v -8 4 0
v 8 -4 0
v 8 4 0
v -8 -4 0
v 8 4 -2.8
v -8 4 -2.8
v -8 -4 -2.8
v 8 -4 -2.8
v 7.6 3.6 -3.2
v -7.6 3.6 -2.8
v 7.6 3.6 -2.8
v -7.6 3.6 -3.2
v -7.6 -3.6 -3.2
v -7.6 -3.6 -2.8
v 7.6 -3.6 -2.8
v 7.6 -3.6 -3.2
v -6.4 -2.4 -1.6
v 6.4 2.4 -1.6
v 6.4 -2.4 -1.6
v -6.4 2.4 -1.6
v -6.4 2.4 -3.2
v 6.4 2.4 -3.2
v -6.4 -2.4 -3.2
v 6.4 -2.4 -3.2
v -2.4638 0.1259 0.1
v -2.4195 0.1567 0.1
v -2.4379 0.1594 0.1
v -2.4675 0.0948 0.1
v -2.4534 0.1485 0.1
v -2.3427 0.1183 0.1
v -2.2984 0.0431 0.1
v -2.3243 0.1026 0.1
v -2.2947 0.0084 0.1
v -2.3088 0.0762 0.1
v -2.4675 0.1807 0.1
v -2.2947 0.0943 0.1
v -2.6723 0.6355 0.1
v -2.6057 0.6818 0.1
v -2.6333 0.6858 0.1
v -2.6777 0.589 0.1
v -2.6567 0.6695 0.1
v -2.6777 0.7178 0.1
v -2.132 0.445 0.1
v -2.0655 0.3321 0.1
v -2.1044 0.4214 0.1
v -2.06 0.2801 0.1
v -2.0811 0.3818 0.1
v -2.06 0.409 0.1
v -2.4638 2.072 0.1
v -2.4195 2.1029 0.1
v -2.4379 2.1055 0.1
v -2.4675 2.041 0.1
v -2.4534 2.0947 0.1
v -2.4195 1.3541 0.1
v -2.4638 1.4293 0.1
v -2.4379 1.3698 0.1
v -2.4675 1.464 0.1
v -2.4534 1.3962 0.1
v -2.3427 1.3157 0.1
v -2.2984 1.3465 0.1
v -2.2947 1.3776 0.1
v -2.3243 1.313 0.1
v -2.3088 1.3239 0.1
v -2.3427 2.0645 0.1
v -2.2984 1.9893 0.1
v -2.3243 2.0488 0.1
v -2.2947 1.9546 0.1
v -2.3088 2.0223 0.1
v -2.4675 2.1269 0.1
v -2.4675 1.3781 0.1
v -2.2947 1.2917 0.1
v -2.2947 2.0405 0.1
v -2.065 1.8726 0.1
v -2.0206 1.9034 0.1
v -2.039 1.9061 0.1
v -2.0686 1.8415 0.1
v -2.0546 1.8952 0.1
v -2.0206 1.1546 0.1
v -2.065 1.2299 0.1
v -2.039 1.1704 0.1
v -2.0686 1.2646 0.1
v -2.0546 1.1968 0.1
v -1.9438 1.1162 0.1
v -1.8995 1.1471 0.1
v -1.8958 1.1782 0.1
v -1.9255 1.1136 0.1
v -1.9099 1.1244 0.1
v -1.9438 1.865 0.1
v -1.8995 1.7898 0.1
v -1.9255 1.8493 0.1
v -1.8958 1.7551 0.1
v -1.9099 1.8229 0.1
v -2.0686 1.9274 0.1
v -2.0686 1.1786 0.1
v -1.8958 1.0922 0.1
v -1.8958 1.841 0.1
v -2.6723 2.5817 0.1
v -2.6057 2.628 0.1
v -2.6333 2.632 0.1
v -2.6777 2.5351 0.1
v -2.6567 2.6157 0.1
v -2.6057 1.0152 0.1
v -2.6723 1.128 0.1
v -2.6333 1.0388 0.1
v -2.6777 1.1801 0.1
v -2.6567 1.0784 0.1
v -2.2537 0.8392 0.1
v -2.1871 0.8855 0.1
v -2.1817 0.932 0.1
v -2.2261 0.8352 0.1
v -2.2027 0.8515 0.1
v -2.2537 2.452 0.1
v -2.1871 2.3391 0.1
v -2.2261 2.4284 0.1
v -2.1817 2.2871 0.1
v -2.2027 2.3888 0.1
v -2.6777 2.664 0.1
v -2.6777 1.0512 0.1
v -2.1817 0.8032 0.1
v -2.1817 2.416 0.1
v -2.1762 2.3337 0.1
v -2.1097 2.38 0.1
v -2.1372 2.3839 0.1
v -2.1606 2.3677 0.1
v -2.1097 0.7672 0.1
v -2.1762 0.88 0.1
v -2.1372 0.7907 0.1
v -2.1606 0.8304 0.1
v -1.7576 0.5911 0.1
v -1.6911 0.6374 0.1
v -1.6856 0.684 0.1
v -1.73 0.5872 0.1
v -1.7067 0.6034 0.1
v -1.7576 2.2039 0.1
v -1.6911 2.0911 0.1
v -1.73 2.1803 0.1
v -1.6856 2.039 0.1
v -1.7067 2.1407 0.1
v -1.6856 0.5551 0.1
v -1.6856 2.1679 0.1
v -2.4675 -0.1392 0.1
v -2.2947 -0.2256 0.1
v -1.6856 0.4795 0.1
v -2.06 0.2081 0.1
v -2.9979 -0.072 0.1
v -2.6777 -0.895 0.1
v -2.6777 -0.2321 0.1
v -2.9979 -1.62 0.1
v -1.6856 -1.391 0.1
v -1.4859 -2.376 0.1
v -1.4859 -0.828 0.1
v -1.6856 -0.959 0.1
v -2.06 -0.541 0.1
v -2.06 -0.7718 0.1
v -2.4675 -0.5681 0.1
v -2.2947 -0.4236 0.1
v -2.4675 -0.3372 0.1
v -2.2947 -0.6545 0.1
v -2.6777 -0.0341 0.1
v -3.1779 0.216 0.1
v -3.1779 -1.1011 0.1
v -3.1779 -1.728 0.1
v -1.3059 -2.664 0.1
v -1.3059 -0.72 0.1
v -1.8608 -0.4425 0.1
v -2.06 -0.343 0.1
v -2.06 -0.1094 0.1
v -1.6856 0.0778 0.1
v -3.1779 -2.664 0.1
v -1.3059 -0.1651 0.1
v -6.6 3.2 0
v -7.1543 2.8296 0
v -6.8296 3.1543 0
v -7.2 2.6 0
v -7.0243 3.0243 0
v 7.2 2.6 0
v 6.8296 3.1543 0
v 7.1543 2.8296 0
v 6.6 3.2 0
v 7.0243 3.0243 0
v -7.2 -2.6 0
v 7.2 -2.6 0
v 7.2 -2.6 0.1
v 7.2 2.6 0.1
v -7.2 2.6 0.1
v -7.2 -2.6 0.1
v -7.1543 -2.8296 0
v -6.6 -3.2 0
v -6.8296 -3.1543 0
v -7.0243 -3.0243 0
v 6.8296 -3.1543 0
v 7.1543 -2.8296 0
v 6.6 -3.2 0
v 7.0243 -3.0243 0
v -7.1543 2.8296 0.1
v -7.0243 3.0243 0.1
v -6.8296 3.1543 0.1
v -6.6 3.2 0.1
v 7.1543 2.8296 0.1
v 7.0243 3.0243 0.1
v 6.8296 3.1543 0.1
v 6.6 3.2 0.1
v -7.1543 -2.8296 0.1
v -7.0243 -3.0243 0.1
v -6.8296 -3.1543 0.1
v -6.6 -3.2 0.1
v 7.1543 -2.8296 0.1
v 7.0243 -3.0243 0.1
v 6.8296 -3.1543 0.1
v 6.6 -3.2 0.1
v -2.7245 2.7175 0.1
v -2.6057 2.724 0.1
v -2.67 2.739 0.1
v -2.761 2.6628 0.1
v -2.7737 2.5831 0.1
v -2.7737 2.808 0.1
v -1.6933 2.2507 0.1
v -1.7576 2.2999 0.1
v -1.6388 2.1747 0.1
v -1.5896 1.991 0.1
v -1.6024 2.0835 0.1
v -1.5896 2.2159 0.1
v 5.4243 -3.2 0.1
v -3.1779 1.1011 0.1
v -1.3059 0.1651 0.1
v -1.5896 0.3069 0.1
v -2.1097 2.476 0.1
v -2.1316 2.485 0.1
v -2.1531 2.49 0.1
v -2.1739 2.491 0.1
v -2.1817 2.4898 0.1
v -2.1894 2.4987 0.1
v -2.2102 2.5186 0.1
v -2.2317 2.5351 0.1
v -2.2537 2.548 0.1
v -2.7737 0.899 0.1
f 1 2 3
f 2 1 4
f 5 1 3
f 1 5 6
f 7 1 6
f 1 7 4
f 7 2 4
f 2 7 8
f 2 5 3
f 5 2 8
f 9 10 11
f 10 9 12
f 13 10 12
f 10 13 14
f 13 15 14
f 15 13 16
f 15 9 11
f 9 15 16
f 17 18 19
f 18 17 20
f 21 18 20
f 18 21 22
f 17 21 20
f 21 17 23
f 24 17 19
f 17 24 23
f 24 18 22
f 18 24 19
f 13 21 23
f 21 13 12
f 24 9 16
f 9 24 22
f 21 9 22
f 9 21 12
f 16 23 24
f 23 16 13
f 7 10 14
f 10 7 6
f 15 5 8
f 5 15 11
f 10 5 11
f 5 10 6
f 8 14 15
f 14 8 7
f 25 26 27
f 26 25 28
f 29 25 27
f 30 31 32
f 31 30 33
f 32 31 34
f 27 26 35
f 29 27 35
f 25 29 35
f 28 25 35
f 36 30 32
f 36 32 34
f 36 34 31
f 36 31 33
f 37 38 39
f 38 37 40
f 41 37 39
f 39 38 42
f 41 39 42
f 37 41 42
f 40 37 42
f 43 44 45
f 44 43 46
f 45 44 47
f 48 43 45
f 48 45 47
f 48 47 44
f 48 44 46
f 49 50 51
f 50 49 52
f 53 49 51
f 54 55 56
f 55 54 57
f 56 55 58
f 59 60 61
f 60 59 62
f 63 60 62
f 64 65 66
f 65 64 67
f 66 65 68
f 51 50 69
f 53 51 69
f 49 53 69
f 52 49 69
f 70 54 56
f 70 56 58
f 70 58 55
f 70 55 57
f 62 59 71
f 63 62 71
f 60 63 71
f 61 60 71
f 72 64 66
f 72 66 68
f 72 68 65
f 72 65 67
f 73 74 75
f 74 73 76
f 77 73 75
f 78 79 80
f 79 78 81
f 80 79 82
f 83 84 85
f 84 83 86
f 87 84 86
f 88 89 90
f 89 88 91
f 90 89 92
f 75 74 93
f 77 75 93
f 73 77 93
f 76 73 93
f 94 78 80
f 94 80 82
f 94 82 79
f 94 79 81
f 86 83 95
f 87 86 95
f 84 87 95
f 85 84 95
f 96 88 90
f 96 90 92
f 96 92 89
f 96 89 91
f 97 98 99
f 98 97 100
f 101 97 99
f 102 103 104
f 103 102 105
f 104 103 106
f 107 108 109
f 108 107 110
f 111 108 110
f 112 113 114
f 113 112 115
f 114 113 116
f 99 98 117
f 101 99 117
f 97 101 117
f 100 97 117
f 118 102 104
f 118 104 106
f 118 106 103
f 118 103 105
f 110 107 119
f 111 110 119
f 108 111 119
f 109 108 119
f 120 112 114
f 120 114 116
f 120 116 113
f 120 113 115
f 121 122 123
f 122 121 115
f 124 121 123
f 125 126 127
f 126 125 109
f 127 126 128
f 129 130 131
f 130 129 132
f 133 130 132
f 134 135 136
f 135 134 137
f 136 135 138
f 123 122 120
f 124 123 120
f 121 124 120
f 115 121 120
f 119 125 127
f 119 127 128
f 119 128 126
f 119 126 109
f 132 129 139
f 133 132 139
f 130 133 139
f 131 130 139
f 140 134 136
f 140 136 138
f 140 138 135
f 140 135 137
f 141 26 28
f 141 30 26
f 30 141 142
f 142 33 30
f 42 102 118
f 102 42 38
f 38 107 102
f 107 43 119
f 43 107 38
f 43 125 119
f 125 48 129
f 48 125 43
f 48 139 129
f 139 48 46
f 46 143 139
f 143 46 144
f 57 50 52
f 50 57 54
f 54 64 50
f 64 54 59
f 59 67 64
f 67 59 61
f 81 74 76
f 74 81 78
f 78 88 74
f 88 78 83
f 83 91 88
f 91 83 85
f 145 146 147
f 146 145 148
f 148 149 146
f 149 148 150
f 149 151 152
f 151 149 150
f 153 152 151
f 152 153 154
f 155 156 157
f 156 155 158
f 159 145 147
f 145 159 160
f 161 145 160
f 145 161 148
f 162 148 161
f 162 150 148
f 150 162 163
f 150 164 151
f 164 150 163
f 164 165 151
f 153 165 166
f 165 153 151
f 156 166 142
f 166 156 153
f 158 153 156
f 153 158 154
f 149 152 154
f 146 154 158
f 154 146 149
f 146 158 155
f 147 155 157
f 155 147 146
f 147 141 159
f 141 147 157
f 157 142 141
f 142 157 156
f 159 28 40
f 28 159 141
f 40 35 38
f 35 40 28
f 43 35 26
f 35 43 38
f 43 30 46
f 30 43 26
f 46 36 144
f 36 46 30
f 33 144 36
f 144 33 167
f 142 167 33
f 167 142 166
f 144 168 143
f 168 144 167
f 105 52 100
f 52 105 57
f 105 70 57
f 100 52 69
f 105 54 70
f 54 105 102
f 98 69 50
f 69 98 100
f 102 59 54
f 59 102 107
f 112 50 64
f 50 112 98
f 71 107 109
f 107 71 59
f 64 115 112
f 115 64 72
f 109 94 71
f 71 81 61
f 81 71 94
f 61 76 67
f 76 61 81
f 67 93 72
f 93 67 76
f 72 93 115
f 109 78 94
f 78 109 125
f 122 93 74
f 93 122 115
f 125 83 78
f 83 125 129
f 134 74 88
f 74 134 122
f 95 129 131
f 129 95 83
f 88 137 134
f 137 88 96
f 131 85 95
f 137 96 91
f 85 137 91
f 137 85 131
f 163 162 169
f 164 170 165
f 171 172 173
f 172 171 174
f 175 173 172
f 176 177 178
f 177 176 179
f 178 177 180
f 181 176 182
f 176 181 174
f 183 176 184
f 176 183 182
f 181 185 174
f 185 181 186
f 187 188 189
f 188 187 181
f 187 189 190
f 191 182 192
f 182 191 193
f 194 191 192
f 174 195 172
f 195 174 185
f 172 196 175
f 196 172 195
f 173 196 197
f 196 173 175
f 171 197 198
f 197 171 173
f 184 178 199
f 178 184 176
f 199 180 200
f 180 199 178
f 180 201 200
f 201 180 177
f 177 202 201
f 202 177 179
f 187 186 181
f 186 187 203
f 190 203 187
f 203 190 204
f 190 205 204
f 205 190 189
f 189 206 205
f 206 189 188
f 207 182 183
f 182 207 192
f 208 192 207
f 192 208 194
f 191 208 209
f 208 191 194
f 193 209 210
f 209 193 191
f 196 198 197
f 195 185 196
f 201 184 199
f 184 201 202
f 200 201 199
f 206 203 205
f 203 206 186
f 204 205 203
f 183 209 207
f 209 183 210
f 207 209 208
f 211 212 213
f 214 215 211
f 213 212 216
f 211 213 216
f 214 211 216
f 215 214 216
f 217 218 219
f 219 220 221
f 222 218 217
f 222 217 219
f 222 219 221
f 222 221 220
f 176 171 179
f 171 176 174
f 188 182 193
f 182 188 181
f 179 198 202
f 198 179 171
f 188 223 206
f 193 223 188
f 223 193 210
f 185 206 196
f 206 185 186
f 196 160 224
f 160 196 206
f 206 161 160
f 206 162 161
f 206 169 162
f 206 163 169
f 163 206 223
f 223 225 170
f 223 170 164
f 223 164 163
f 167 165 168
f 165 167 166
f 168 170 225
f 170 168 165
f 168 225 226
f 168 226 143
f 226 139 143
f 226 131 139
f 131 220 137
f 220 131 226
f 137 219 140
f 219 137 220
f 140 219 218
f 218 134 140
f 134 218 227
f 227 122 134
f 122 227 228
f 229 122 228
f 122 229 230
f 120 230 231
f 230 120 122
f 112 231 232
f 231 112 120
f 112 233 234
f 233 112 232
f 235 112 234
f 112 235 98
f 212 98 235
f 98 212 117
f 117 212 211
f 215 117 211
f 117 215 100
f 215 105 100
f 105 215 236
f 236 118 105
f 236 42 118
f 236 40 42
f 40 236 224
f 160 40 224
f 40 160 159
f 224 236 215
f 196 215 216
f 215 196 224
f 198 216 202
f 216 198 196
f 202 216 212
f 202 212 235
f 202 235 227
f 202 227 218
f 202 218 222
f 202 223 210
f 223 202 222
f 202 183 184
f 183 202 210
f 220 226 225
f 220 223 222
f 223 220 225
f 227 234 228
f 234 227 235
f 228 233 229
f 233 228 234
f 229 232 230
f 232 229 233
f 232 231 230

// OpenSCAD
// file: ../p/box5.scad
use <../lib.scad>
function ldraw_lib__box5() = [
// 0 Box with 5 Faces and All Edges
// 0 Name: box5.dat
// 0 Author: James Jessiman
// 0 !LDRAW_ORG Primitive UPDATE 2012-01
// 0 !LICENSE Licensed under CC BY 4.0 : see CAreadme.txt
// 
// 0 BFC CERTIFY CCW
  [0,"BFC","CERTIFY"],
  [0,"BFC","CCW"],
// 
// 0 !HISTORY 2002-04-03 [sbliss] Modified for BFC compliance
// 0 !HISTORY 2002-04-25 [PTadmin] Official Update 2002-02
// 0 !HISTORY 2007-06-24 [PTadmin] Header formatted for Contributor Agreement
// 0 !HISTORY 2008-07-01 [PTadmin] Official Update 2008-01
// 0 !HISTORY 2012-02-16 [Philo] Changed to CCW
// 0 !HISTORY 2012-03-30 [PTadmin] Official Update 2012-01
// 
// 
// 2 24 1 1 1 -1 1 1
  [2,24,1,1,1,-1,1,1],
// 2 24 -1 1 1 -1 1 -1
  [2,24,-1,1,1,-1,1,-1],
// 2 24 -1 1 -1 1 1 -1
  [2,24,-1,1,-1,1,1,-1],
// 2 24 1 1 -1 1 1 1
  [2,24,1,1,-1,1,1,1],
// 2 24 1 0 1 -1 0 1
  [2,24,1,0,1,-1,0,1],
// 2 24 -1 0 1 -1 0 -1
  [2,24,-1,0,1,-1,0,-1],
// 2 24 -1 0 -1 1 0 -1
  [2,24,-1,0,-1,1,0,-1],
// 2 24 1 0 -1 1 0 1
  [2,24,1,0,-1,1,0,1],
// 2 24 1 0 1 1 1 1
  [2,24,1,0,1,1,1,1],
// 2 24 -1 0 1 -1 1 1
  [2,24,-1,0,1,-1,1,1],
// 2 24 1 0 -1 1 1 -1
  [2,24,1,0,-1,1,1,-1],
// 2 24 -1 0 -1 -1 1 -1
  [2,24,-1,0,-1,-1,1,-1],
// 4 16 -1 1 1 1 1 1 1 1 -1 -1 1 -1
  [4,16,-1,1,1,1,1,1,1,1,-1,-1,1,-1],
// 4 16 -1 1 1 -1 0 1 1 0 1 1 1 1
  [4,16,-1,1,1,-1,0,1,1,0,1,1,1,1],
// 4 16 -1 1 -1 -1 0 -1 -1 0 1 -1 1 1
  [4,16,-1,1,-1,-1,0,-1,-1,0,1,-1,1,1],
// 4 16 1 1 -1 1 0 -1 -1 0 -1 -1 1 -1
  [4,16,1,1,-1,1,0,-1,-1,0,-1,-1,1,-1],
// 4 16 1 1 1 1 0 1 1 0 -1 1 1 -1
  [4,16,1,1,1,1,0,1,1,0,-1,1,1,-1],
];
module ldraw_lib__box5(step=0, col=false, unit=2/5, alt=false, line=0.2, solid=!$preview)
    makepoly(ldraw_lib__box5(), step=step, col=col, unit=unit, alt=alt, line=line, solid=solid);
ldraw_lib__box5(line=0.2);
// file: ../p/box4.scad
use <../lib.scad>
function ldraw_lib__box4() = [
// 0 Box with 4 Faces (2 Parallel Pairs) and All Edges
// 0 Name: box4.dat
// 0 Author: James Jessiman
// 0 !LDRAW_ORG Primitive UPDATE 2012-01
// 0 !LICENSE Licensed under CC BY 4.0 : see CAreadme.txt
// 
// 0 BFC CERTIFY CCW
  [0,"BFC","CERTIFY"],
  [0,"BFC","CCW"],
// 
// 0 !HISTORY 2002-04-03 [sbliss] Modified for BFC compliance
// 0 !HISTORY 2002-04-25 [PTadmin] Official Update 2002-02
// 0 !HISTORY 2007-06-24 [PTadmin] Header formatted for Contributor Agreement
// 0 !HISTORY 2008-07-01 [PTadmin] Official Update 2008-01
// 0 !HISTORY 2012-02-16 [Philo] Changed to CCW
// 0 !HISTORY 2012-03-30 [PTadmin] Official Update 2012-01
// 
// 
// 2 24 1 1 1 -1 1 1
  [2,24,1,1,1,-1,1,1],
// 2 24 -1 1 1 -1 1 -1
  [2,24,-1,1,1,-1,1,-1],
// 2 24 -1 1 -1 1 1 -1
  [2,24,-1,1,-1,1,1,-1],
// 2 24 1 1 -1 1 1 1
  [2,24,1,1,-1,1,1,1],
// 2 24 1 0 1 -1 0 1
  [2,24,1,0,1,-1,0,1],
// 2 24 -1 0 1 -1 0 -1
  [2,24,-1,0,1,-1,0,-1],
// 2 24 -1 0 -1 1 0 -1
  [2,24,-1,0,-1,1,0,-1],
// 2 24 1 0 -1 1 0 1
  [2,24,1,0,-1,1,0,1],
// 2 24 1 0 1 1 1 1
  [2,24,1,0,1,1,1,1],
// 2 24 -1 0 1 -1 1 1
  [2,24,-1,0,1,-1,1,1],
// 2 24 1 0 -1 1 1 -1
  [2,24,1,0,-1,1,1,-1],
// 2 24 -1 0 -1 -1 1 -1
  [2,24,-1,0,-1,-1,1,-1],
// 4 16 -1 1 1 -1 0 1 1 0 1 1 1 1
  [4,16,-1,1,1,-1,0,1,1,0,1,1,1,1],
// 4 16 -1 1 -1 -1 0 -1 -1 0 1 -1 1 1
  [4,16,-1,1,-1,-1,0,-1,-1,0,1,-1,1,1],
// 4 16 1 1 -1 1 0 -1 -1 0 -1 -1 1 -1
  [4,16,1,1,-1,1,0,-1,-1,0,-1,-1,1,-1],
// 4 16 1 1 1 1 0 1 1 0 -1 1 1 -1
  [4,16,1,1,1,1,0,1,1,0,-1,1,1,-1],
];
module ldraw_lib__box4(step=0, col=false, unit=2/5, alt=false, line=0.2, solid=!$preview)
    makepoly(ldraw_lib__box4(), step=step, col=col, unit=unit, alt=alt, line=line, solid=solid);
ldraw_lib__box4(line=0.2);
// file: ../p/box3u12.scad
use <../lib.scad>
function ldraw_lib__box3u12() = [
// 0 Box with 3 Parallel Faces without Any Edges
// 0 Name: box3u12.dat
// 0 Author: J.C. Tchang [tchang]
// 0 !LDRAW_ORG Primitive UPDATE 2014-02
// 0 !LICENSE Licensed under CC BY 4.0 : see CAreadme.txt
// 
// 0 BFC CERTIFY CCW
  [0,"BFC","CERTIFY"],
  [0,"BFC","CCW"],
// 
// 0 !HISTORY 2014-12-23 [PTadmin] Official Update 2014-02
// 
// 
// 4 16 -1 1 1 1 1 1 1 1 -1 -1 1 -1
  [4,16,-1,1,1,1,1,1,1,1,-1,-1,1,-1],
// 4 16 -1 1 1 -1 0 1 1 0 1 1 1 1
  [4,16,-1,1,1,-1,0,1,1,0,1,1,1,1],
// 4 16 1 1 -1 1 0 -1 -1 0 -1 -1 1 -1
  [4,16,1,1,-1,1,0,-1,-1,0,-1,-1,1,-1],
];
module ldraw_lib__box3u12(step=0, col=false, unit=2/5, alt=false, line=0.2, solid=!$preview)
    makepoly(ldraw_lib__box3u12(), step=step, col=col, unit=unit, alt=alt, line=line, solid=solid);
ldraw_lib__box3u12(line=0.2);
// file: ../p/1-8chrd.scad
use <../lib.scad>
function ldraw_lib__1_8chrd() = [
// 0 Chord 0.125
// 0 Name: 1-8chrd.dat
// 0 Author: Orion Pobursky [OrionP]
// 0 !LDRAW_ORG Primitive UPDATE 2023-05
// 0 !LICENSE Licensed under CC BY 4.0 : see CAreadme.txt
// 
// 0 BFC CERTIFY CCW
  [0,"BFC","CERTIFY"],
  [0,"BFC","CCW"],
// 
// 0 !HISTORY 2004-04-22 [PTadmin] Official Update 2004-02
// 0 !HISTORY 2007-06-22 [PTadmin] Header formatted for Contributor Agreement
// 0 !HISTORY 2008-07-01 [PTadmin] Official Update 2008-01
// 0 !HISTORY 2023-10-27 [OrionP] Rebuilt with PrimGen2, original author westrate
// 0 !HISTORY 2023-10-31 [OrionP] Official Update 2023-05
// 
// 3 16 1 0 0 0.9239 0 0.3827 0.7071 0 0.7071
  [3,16,1,0,0,0.9239,0,0.3827,0.7071,0,0.7071],
];
module ldraw_lib__1_8chrd(step=0, col=false, unit=2/5, alt=false, line=0.2, solid=!$preview)
    makepoly(ldraw_lib__1_8chrd(), step=step, col=col, unit=unit, alt=alt, line=line, solid=solid);
ldraw_lib__1_8chrd(line=0.2);
// file: ../p/1-4ndis.scad
use <../lib.scad>
function ldraw_lib__1_4ndis() = [
// 0 Disc Negative 0.25
// 0 Name: 1-4ndis.dat
// 0 Author: James Jessiman
// 0 !LDRAW_ORG Primitive UPDATE 2012-01
// 0 !LICENSE Licensed under CC BY 4.0 : see CAreadme.txt
// 
// 0 BFC CERTIFY CCW
  [0,"BFC","CERTIFY"],
  [0,"BFC","CCW"],
// 
// 0 !HISTORY 2002-03-23 [sbliss] Added BFC Statement
// 0 !HISTORY 2002-04-25 [PTadmin] Official Update 2002-02
// 0 !HISTORY 2007-06-22 [PTadmin] Header formatted for Contributor Agreement
// 0 !HISTORY 2008-07-01 [PTadmin] Official Update 2008-01
// 0 !HISTORY 2012-02-16 [Philo] Changed to CCW
// 0 !HISTORY 2012-03-30 [PTadmin] Official Update 2012-01
// 
// 
// 3 16 0.9239 0 0.3827 1 0 0 1 0 1
  [3,16,0.9239,0,0.3827,1,0,0,1,0,1],
// 3 16 0.7071 0 0.7071 0.9239 0 0.3827 1 0 1
  [3,16,0.7071,0,0.7071,0.9239,0,0.3827,1,0,1],
// 3 16 0.3827 0 0.9239 0.7071 0 0.7071 1 0 1
  [3,16,0.3827,0,0.9239,0.7071,0,0.7071,1,0,1],
// 3 16 0 0 1 0.3827 0 0.9239 1 0 1
  [3,16,0,0,1,0.3827,0,0.9239,1,0,1],
];
module ldraw_lib__1_4ndis(step=0, col=false, unit=2/5, alt=false, line=0.2, solid=!$preview)
    makepoly(ldraw_lib__1_4ndis(), step=step, col=col, unit=unit, alt=alt, line=line, solid=solid);
ldraw_lib__1_4ndis(line=0.2);
// file: ../p/1-4cyli.scad
use <../lib.scad>
function ldraw_lib__1_4cyli() = [
// 0 Cylinder 0.25
// 0 Name: 1-4cyli.dat
// 0 Author: James Jessiman
// 0 !LDRAW_ORG Primitive UPDATE 2012-01
// 0 !LICENSE Licensed under CC BY 4.0 : see CAreadme.txt
// 
// 0 BFC CERTIFY CCW
  [0,"BFC","CERTIFY"],
  [0,"BFC","CCW"],
// 
// 0 !HISTORY 2002-03-23 [sbliss] Added BFC statement.
// 0 !HISTORY 2002-04-25 [PTadmin] Official Update 2002-02
// 0 !HISTORY 2007-06-22 [PTadmin] Header formatted for Contributor Agreement
// 0 !HISTORY 2008-07-01 [PTadmin] Official Update 2008-01
// 0 !HISTORY 2012-02-16 [Philo] Changed to CCW
// 0 !HISTORY 2012-03-30 [PTadmin] Official Update 2012-01
// 
// 
// 4 16 1 1 0 0.9239 1 0.3827 0.9239 0 0.3827 1 0 0
  [4,16,1,1,0,0.9239,1,0.3827,0.9239,0,0.3827,1,0,0],
// 5 24 1 0 0 1 1 0 0.9239 0 0.3827 1 0 -1
  [5,24,1,0,0,1,1,0,0.9239,0,0.3827,1,0,-1],
// 4 16 0.9239 1 0.3827 0.7071 1 0.7071 0.7071 0 0.7071 0.9239 0 0.3827
  [4,16,0.9239,1,0.3827,0.7071,1,0.7071,0.7071,0,0.7071,0.9239,0,0.3827],
// 5 24 0.9239 0 0.3827 0.9239 1 0.3827 0.7071 0 0.7071 1 0 0
  [5,24,0.9239,0,0.3827,0.9239,1,0.3827,0.7071,0,0.7071,1,0,0],
// 4 16 0.7071 1 0.7071 0.3827 1 0.9239 0.3827 0 0.9239 0.7071 0 0.7071
  [4,16,0.7071,1,0.7071,0.3827,1,0.9239,0.3827,0,0.9239,0.7071,0,0.7071],
// 5 24 0.7071 0 0.7071 0.7071 1 0.7071 0.3827 0 0.9239 0.9239 0 0.3827
  [5,24,0.7071,0,0.7071,0.7071,1,0.7071,0.3827,0,0.9239,0.9239,0,0.3827],
// 4 16 0.3827 1 0.9239 0 1 1 0 0 1 0.3827 0 0.9239
  [4,16,0.3827,1,0.9239,0,1,1,0,0,1,0.3827,0,0.9239],
// 5 24 0.3827 0 0.9239 0.3827 1 0.9239 0 0 1 0.7071 0 0.7071
  [5,24,0.3827,0,0.9239,0.3827,1,0.9239,0,0,1,0.7071,0,0.7071],
// 5 24 0 0 1 0 1 1 0.3827 0 0.9239 -1 0 1
  [5,24,0,0,1,0,1,1,0.3827,0,0.9239,-1,0,1],
];
module ldraw_lib__1_4cyli(step=0, col=false, unit=2/5, alt=false, line=0.2, solid=!$preview)
    makepoly(ldraw_lib__1_4cyli(), step=step, col=col, unit=unit, alt=alt, line=line, solid=solid);
ldraw_lib__1_4cyli(line=0.2);
// file: ../p/1-4chrd.scad
use <../lib.scad>
function ldraw_lib__1_4chrd() = [
// 0 Chord 0.25
// 0 Name: 1-4chrd.dat
// 0 Author: Max Martin Richter [MMR1988]
// 0 !LDRAW_ORG Primitive UPDATE 2023-05
// 0 !LICENSE Licensed under CC BY 4.0 : see CAreadme.txt
// 
// 0 BFC CERTIFY CCW
  [0,"BFC","CERTIFY"],
  [0,"BFC","CCW"],
// 
// 0 !HISTORY 2004-04-22 [PTadmin] Official Update 2004-02
// 0 !HISTORY 2007-10-09 [PTadmin] Header formatted for Contributor Agreement
// 0 !HISTORY 2008-07-01 [PTadmin] Official Update 2008-01
// 0 !HISTORY 2012-08-02 [MMR1988] Re-creation with PrimGen2 and Rectifier
// 0 !HISTORY 2012-08-09 [PTadmin] Official Update 2012-02
// 0 !HISTORY 2023-10-27 [OrionP] Change author to MMR1988 from hafhead
// 0 !HISTORY 2023-10-31 [OrionP] Official Update 2023-05
// 
// 4 16 0.9239 0 0.3827 0.3827 0 0.9239 0 0 1 1 0 0
  [4,16,0.9239,0,0.3827,0.3827,0,0.9239,0,0,1,1,0,0],
// 3 16 0.7071 0 0.7071 0.3827 0 0.9239 0.9239 0 0.3827
  [3,16,0.7071,0,0.7071,0.3827,0,0.9239,0.9239,0,0.3827],
];
module ldraw_lib__1_4chrd(step=0, col=false, unit=2/5, alt=false, line=0.2, solid=!$preview)
    makepoly(ldraw_lib__1_4chrd(), step=step, col=col, unit=unit, alt=alt, line=line, solid=solid);
ldraw_lib__1_4chrd(line=0.2);
// file: s/3069bs01.scad
use <../../lib.scad>
use <../../p/box4.scad>
use <../../p/box5.scad>
function ldraw_lib__s__3069bs01() = [
// 0 ~Tile  1 x  2 with Groove without Top Face
// 0 Name: s\3069bs01.dat
// 0 Author: Santeri Piippo [arezey]
// 0 !LDRAW_ORG Subpart UPDATE 2010-02
// 0 !LICENSE Licensed under CC BY 4.0 : see CAreadme.txt
// 
// 0 BFC CERTIFY CCW
  [0,"BFC","CERTIFY"],
  [0,"BFC","CCW"],
// 
// 0 !HISTORY 2010-07-05 [PTadmin] Official Update 2010-02
// 
// 
// 1 16 0 0 0 20 0 0 0 7 0 0 0 10 box4.dat
  [1,16,0,0,0,20,0,0,0,7,0,0,0,10, ldraw_lib__box4()],
// 1 16 0 7 0 19 0 0 0 1 0 0 0 9 box4.dat
  [1,16,0,7,0,19,0,0,0,1,0,0,0,9, ldraw_lib__box4()],
// 0 BFC INVERTNEXT
  [0,"BFC","INVERTNEXT"],
// 1 16 0 8 0 16 0 0 0 -4 0 0 0 6 box5.dat
  [1,16,0,8,0,16,0,0,0,-4,0,0,0,6, ldraw_lib__box5()],
// 4 16 -19 8 9 -16 8 6 -16 8 -6 -19 8 -9
  [4,16,-19,8,9,-16,8,6,-16,8,-6,-19,8,-9],
// 4 16 19 8 -9 16 8 -6 16 8 6 19 8 9
  [4,16,19,8,-9,16,8,-6,16,8,6,19,8,9],
// 4 16 19 8 9 16 8 6 -16 8 6 -19 8 9
  [4,16,19,8,9,16,8,6,-16,8,6,-19,8,9],
// 4 16 -19 8 -9 -16 8 -6 16 8 -6 19 8 -9
  [4,16,-19,8,-9,-16,8,-6,16,8,-6,19,8,-9],
// 4 16 -20 7 10 -19 7 9 -19 7 -9 -20 7 -10
  [4,16,-20,7,10,-19,7,9,-19,7,-9,-20,7,-10],
// 4 16 20 7 -10 19 7 -9 19 7 9 20 7 10
  [4,16,20,7,-10,19,7,-9,19,7,9,20,7,10],
// 4 16 20 7 10 19 7 9 -19 7 9 -20 7 10
  [4,16,20,7,10,19,7,9,-19,7,9,-20,7,10],
// 4 16 -20 7 -10 -19 7 -9 19 7 -9 20 7 -10
  [4,16,-20,7,-10,-19,7,-9,19,7,-9,20,7,-10],
// 0 //
];
module ldraw_lib__s__3069bs01(step=0, col=false, unit=2/5, alt=false, line=0.2, solid=!$preview)
    makepoly(ldraw_lib__s__3069bs01(), step=step, col=col, unit=unit, alt=alt, line=line, solid=solid);
ldraw_lib__s__3069bs01(line=0.2);
// file: 3069b.scad
use <../lib.scad>
use <s/3069bs01.scad>
function ldraw_lib__3069b() = [
// 0 Tile  1 x  2 with Groove
// 0 Name: 3069b.dat
// 0 Author: Santeri Piippo [arezey]
// 0 !LDRAW_ORG Part UPDATE 2010-02
// 0 !LICENSE Licensed under CC BY 4.0 : see CAreadme.txt
// 
// 0 BFC CERTIFY CCW
  [0,"BFC","CERTIFY"],
  [0,"BFC","CCW"],
// 
// 0 !KEYWORDS BrickLink 3069
// 
// 0 !HISTORY 2010-07-05 [PTadmin] Official Update 2010-02
// 
// 
// 4 16 20 0 -10 20 0 10 -20 0 10 -20 0 -10
  [4,16,20,0,-10,20,0,10,-20,0,10,-20,0,-10],
// 1 16 0 0 0 1 0 0 0 1 0 0 0 1 s\3069bs01.dat
  [1,16,0,0,0,1,0,0,0,1,0,0,0,1, ldraw_lib__s__3069bs01()],
// 0 //
];
module ldraw_lib__3069b(step=0, col=false, unit=2/5, alt=false, line=0.2, solid=!$preview)
    makepoly(ldraw_lib__3069b(), step=step, col=col, unit=unit, alt=alt, line=line, solid=solid);
ldraw_lib__3069b(line=0.2);
// main file
use <../lib.scad>
use <3069b.scad>
use <6142271h.scad>
function ldraw_lib__3069bd1f() = [
// 0 Tile  1 x  2 with R8 Logo on Black and White Background Left Sticker
// 0 Name: 3069bd1f.dat
// 0 Author: Vincent Messenet [Cheenzo]
// 0 !LDRAW_ORG Shortcut UPDATE 2025-05
// 0 !LICENSE Licensed under CC BY 4.0 : see CAreadme.txt
// 
// 0 BFC CERTIFY CCW
  [0,"BFC","CERTIFY"],
  [0,"BFC","CCW"],
// 
// 0 !CATEGORY Sticker Shortcut
// 0 !KEYWORDS Audi R8 LMS ultra, Bricklink 3069pb0647L, Set 75873
// 
// 0 !HISTORY 2025-05-28 [OrionP] Official Update 2025-05
// 
// 1 16 0 0 0 1 0 0 0 1 0 0 0 1 3069b.dat
  [1,16,0,0,0,1,0,0,0,1,0,0,0,1, ldraw_lib__3069b()],
// 1 16 0 0 0 0 0 -1 0 1 0 1 0 0 6142271h.dat
  [1,16,0,0,0,0,0,-1,0,1,0,1,0,0, ldraw_lib__6142271h()],
];
module ldraw_lib__3069bd1f(step=0, col=false, unit=2/5, alt=false, line=0.2, solid=!$preview)
    makepoly(ldraw_lib__3069bd1f(), step=step, col=col, unit=unit, alt=alt, line=line, solid=solid);
ldraw_lib__3069bd1f(line=0.2);
